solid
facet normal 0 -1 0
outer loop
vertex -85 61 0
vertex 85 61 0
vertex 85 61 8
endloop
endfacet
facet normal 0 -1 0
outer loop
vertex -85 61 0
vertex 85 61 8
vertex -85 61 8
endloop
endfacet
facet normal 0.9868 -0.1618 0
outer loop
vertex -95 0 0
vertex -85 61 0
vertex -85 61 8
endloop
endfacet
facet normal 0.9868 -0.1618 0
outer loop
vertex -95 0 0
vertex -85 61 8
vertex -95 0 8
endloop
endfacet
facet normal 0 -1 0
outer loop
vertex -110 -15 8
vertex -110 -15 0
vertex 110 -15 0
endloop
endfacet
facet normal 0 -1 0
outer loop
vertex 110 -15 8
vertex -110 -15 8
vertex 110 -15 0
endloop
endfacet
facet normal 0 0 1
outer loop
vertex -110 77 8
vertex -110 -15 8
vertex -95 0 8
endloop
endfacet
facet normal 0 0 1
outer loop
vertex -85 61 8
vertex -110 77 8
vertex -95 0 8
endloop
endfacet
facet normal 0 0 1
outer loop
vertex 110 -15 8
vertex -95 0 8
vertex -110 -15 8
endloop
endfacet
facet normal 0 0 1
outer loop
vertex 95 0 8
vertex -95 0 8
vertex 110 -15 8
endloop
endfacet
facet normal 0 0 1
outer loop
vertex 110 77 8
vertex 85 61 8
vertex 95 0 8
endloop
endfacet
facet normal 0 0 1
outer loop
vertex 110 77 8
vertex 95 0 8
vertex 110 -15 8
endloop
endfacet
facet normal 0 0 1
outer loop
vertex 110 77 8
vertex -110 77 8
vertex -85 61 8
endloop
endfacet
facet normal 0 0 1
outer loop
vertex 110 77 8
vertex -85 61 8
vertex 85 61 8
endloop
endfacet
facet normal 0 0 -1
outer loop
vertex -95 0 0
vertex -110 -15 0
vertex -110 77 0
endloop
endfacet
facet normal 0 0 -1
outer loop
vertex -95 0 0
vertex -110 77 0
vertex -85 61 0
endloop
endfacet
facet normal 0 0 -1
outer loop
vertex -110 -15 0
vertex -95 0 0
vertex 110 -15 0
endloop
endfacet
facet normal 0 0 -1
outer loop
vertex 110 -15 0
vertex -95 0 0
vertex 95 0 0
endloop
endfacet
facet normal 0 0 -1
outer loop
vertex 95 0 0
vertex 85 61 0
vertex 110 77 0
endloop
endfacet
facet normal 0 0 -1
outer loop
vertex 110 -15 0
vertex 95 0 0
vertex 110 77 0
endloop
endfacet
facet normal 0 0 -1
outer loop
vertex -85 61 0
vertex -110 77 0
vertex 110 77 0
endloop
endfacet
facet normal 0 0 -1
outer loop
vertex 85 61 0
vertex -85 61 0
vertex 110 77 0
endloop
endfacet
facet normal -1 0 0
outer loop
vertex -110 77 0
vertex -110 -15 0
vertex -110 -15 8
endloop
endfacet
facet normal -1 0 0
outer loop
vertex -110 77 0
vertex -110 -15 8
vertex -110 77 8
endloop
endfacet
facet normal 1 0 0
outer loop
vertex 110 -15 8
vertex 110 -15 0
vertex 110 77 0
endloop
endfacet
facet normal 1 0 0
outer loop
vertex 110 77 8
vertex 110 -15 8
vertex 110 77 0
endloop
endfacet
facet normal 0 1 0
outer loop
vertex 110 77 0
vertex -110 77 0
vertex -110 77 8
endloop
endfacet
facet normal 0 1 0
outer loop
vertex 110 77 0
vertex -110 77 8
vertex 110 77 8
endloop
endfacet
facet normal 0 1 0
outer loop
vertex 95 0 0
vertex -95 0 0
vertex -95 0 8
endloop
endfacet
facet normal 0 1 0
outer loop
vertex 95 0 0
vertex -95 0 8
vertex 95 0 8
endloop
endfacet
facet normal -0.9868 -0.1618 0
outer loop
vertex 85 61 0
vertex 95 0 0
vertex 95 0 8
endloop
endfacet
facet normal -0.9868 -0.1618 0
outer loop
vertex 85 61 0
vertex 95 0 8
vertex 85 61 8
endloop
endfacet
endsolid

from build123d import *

# Parameters (mm, degrees)
EXTRUDE_DEPTH = 10
BOX_W         = 220
BOX_H         = 92
BOX_DEPTH     = 8


with BuildPart() as extrude_body:
    # Sketch001 → Extrude (new body)
    with BuildSketch(Plane.XY):
        Polygon((-95, 0), (95, 0), (85, 61), (-85, 61), align=None)
    extrude(amount=EXTRUDE_DEPTH)


with BuildPart() as molde_cortador:
    # Box → Box (new body)
    with BuildSketch(Plane(origin=(-110, -15, 0), x_dir=(1, 0, 0), z_dir=(0, 0, 1))):
        with Locations((110, 46)):
            Rectangle(BOX_W, BOX_H)
    extrude(amount=BOX_DEPTH)

    # Cut: cut Extrude body
    add(extrude_body.part, mode=Mode.SUBTRACT)


solid = molde_cortador.part
